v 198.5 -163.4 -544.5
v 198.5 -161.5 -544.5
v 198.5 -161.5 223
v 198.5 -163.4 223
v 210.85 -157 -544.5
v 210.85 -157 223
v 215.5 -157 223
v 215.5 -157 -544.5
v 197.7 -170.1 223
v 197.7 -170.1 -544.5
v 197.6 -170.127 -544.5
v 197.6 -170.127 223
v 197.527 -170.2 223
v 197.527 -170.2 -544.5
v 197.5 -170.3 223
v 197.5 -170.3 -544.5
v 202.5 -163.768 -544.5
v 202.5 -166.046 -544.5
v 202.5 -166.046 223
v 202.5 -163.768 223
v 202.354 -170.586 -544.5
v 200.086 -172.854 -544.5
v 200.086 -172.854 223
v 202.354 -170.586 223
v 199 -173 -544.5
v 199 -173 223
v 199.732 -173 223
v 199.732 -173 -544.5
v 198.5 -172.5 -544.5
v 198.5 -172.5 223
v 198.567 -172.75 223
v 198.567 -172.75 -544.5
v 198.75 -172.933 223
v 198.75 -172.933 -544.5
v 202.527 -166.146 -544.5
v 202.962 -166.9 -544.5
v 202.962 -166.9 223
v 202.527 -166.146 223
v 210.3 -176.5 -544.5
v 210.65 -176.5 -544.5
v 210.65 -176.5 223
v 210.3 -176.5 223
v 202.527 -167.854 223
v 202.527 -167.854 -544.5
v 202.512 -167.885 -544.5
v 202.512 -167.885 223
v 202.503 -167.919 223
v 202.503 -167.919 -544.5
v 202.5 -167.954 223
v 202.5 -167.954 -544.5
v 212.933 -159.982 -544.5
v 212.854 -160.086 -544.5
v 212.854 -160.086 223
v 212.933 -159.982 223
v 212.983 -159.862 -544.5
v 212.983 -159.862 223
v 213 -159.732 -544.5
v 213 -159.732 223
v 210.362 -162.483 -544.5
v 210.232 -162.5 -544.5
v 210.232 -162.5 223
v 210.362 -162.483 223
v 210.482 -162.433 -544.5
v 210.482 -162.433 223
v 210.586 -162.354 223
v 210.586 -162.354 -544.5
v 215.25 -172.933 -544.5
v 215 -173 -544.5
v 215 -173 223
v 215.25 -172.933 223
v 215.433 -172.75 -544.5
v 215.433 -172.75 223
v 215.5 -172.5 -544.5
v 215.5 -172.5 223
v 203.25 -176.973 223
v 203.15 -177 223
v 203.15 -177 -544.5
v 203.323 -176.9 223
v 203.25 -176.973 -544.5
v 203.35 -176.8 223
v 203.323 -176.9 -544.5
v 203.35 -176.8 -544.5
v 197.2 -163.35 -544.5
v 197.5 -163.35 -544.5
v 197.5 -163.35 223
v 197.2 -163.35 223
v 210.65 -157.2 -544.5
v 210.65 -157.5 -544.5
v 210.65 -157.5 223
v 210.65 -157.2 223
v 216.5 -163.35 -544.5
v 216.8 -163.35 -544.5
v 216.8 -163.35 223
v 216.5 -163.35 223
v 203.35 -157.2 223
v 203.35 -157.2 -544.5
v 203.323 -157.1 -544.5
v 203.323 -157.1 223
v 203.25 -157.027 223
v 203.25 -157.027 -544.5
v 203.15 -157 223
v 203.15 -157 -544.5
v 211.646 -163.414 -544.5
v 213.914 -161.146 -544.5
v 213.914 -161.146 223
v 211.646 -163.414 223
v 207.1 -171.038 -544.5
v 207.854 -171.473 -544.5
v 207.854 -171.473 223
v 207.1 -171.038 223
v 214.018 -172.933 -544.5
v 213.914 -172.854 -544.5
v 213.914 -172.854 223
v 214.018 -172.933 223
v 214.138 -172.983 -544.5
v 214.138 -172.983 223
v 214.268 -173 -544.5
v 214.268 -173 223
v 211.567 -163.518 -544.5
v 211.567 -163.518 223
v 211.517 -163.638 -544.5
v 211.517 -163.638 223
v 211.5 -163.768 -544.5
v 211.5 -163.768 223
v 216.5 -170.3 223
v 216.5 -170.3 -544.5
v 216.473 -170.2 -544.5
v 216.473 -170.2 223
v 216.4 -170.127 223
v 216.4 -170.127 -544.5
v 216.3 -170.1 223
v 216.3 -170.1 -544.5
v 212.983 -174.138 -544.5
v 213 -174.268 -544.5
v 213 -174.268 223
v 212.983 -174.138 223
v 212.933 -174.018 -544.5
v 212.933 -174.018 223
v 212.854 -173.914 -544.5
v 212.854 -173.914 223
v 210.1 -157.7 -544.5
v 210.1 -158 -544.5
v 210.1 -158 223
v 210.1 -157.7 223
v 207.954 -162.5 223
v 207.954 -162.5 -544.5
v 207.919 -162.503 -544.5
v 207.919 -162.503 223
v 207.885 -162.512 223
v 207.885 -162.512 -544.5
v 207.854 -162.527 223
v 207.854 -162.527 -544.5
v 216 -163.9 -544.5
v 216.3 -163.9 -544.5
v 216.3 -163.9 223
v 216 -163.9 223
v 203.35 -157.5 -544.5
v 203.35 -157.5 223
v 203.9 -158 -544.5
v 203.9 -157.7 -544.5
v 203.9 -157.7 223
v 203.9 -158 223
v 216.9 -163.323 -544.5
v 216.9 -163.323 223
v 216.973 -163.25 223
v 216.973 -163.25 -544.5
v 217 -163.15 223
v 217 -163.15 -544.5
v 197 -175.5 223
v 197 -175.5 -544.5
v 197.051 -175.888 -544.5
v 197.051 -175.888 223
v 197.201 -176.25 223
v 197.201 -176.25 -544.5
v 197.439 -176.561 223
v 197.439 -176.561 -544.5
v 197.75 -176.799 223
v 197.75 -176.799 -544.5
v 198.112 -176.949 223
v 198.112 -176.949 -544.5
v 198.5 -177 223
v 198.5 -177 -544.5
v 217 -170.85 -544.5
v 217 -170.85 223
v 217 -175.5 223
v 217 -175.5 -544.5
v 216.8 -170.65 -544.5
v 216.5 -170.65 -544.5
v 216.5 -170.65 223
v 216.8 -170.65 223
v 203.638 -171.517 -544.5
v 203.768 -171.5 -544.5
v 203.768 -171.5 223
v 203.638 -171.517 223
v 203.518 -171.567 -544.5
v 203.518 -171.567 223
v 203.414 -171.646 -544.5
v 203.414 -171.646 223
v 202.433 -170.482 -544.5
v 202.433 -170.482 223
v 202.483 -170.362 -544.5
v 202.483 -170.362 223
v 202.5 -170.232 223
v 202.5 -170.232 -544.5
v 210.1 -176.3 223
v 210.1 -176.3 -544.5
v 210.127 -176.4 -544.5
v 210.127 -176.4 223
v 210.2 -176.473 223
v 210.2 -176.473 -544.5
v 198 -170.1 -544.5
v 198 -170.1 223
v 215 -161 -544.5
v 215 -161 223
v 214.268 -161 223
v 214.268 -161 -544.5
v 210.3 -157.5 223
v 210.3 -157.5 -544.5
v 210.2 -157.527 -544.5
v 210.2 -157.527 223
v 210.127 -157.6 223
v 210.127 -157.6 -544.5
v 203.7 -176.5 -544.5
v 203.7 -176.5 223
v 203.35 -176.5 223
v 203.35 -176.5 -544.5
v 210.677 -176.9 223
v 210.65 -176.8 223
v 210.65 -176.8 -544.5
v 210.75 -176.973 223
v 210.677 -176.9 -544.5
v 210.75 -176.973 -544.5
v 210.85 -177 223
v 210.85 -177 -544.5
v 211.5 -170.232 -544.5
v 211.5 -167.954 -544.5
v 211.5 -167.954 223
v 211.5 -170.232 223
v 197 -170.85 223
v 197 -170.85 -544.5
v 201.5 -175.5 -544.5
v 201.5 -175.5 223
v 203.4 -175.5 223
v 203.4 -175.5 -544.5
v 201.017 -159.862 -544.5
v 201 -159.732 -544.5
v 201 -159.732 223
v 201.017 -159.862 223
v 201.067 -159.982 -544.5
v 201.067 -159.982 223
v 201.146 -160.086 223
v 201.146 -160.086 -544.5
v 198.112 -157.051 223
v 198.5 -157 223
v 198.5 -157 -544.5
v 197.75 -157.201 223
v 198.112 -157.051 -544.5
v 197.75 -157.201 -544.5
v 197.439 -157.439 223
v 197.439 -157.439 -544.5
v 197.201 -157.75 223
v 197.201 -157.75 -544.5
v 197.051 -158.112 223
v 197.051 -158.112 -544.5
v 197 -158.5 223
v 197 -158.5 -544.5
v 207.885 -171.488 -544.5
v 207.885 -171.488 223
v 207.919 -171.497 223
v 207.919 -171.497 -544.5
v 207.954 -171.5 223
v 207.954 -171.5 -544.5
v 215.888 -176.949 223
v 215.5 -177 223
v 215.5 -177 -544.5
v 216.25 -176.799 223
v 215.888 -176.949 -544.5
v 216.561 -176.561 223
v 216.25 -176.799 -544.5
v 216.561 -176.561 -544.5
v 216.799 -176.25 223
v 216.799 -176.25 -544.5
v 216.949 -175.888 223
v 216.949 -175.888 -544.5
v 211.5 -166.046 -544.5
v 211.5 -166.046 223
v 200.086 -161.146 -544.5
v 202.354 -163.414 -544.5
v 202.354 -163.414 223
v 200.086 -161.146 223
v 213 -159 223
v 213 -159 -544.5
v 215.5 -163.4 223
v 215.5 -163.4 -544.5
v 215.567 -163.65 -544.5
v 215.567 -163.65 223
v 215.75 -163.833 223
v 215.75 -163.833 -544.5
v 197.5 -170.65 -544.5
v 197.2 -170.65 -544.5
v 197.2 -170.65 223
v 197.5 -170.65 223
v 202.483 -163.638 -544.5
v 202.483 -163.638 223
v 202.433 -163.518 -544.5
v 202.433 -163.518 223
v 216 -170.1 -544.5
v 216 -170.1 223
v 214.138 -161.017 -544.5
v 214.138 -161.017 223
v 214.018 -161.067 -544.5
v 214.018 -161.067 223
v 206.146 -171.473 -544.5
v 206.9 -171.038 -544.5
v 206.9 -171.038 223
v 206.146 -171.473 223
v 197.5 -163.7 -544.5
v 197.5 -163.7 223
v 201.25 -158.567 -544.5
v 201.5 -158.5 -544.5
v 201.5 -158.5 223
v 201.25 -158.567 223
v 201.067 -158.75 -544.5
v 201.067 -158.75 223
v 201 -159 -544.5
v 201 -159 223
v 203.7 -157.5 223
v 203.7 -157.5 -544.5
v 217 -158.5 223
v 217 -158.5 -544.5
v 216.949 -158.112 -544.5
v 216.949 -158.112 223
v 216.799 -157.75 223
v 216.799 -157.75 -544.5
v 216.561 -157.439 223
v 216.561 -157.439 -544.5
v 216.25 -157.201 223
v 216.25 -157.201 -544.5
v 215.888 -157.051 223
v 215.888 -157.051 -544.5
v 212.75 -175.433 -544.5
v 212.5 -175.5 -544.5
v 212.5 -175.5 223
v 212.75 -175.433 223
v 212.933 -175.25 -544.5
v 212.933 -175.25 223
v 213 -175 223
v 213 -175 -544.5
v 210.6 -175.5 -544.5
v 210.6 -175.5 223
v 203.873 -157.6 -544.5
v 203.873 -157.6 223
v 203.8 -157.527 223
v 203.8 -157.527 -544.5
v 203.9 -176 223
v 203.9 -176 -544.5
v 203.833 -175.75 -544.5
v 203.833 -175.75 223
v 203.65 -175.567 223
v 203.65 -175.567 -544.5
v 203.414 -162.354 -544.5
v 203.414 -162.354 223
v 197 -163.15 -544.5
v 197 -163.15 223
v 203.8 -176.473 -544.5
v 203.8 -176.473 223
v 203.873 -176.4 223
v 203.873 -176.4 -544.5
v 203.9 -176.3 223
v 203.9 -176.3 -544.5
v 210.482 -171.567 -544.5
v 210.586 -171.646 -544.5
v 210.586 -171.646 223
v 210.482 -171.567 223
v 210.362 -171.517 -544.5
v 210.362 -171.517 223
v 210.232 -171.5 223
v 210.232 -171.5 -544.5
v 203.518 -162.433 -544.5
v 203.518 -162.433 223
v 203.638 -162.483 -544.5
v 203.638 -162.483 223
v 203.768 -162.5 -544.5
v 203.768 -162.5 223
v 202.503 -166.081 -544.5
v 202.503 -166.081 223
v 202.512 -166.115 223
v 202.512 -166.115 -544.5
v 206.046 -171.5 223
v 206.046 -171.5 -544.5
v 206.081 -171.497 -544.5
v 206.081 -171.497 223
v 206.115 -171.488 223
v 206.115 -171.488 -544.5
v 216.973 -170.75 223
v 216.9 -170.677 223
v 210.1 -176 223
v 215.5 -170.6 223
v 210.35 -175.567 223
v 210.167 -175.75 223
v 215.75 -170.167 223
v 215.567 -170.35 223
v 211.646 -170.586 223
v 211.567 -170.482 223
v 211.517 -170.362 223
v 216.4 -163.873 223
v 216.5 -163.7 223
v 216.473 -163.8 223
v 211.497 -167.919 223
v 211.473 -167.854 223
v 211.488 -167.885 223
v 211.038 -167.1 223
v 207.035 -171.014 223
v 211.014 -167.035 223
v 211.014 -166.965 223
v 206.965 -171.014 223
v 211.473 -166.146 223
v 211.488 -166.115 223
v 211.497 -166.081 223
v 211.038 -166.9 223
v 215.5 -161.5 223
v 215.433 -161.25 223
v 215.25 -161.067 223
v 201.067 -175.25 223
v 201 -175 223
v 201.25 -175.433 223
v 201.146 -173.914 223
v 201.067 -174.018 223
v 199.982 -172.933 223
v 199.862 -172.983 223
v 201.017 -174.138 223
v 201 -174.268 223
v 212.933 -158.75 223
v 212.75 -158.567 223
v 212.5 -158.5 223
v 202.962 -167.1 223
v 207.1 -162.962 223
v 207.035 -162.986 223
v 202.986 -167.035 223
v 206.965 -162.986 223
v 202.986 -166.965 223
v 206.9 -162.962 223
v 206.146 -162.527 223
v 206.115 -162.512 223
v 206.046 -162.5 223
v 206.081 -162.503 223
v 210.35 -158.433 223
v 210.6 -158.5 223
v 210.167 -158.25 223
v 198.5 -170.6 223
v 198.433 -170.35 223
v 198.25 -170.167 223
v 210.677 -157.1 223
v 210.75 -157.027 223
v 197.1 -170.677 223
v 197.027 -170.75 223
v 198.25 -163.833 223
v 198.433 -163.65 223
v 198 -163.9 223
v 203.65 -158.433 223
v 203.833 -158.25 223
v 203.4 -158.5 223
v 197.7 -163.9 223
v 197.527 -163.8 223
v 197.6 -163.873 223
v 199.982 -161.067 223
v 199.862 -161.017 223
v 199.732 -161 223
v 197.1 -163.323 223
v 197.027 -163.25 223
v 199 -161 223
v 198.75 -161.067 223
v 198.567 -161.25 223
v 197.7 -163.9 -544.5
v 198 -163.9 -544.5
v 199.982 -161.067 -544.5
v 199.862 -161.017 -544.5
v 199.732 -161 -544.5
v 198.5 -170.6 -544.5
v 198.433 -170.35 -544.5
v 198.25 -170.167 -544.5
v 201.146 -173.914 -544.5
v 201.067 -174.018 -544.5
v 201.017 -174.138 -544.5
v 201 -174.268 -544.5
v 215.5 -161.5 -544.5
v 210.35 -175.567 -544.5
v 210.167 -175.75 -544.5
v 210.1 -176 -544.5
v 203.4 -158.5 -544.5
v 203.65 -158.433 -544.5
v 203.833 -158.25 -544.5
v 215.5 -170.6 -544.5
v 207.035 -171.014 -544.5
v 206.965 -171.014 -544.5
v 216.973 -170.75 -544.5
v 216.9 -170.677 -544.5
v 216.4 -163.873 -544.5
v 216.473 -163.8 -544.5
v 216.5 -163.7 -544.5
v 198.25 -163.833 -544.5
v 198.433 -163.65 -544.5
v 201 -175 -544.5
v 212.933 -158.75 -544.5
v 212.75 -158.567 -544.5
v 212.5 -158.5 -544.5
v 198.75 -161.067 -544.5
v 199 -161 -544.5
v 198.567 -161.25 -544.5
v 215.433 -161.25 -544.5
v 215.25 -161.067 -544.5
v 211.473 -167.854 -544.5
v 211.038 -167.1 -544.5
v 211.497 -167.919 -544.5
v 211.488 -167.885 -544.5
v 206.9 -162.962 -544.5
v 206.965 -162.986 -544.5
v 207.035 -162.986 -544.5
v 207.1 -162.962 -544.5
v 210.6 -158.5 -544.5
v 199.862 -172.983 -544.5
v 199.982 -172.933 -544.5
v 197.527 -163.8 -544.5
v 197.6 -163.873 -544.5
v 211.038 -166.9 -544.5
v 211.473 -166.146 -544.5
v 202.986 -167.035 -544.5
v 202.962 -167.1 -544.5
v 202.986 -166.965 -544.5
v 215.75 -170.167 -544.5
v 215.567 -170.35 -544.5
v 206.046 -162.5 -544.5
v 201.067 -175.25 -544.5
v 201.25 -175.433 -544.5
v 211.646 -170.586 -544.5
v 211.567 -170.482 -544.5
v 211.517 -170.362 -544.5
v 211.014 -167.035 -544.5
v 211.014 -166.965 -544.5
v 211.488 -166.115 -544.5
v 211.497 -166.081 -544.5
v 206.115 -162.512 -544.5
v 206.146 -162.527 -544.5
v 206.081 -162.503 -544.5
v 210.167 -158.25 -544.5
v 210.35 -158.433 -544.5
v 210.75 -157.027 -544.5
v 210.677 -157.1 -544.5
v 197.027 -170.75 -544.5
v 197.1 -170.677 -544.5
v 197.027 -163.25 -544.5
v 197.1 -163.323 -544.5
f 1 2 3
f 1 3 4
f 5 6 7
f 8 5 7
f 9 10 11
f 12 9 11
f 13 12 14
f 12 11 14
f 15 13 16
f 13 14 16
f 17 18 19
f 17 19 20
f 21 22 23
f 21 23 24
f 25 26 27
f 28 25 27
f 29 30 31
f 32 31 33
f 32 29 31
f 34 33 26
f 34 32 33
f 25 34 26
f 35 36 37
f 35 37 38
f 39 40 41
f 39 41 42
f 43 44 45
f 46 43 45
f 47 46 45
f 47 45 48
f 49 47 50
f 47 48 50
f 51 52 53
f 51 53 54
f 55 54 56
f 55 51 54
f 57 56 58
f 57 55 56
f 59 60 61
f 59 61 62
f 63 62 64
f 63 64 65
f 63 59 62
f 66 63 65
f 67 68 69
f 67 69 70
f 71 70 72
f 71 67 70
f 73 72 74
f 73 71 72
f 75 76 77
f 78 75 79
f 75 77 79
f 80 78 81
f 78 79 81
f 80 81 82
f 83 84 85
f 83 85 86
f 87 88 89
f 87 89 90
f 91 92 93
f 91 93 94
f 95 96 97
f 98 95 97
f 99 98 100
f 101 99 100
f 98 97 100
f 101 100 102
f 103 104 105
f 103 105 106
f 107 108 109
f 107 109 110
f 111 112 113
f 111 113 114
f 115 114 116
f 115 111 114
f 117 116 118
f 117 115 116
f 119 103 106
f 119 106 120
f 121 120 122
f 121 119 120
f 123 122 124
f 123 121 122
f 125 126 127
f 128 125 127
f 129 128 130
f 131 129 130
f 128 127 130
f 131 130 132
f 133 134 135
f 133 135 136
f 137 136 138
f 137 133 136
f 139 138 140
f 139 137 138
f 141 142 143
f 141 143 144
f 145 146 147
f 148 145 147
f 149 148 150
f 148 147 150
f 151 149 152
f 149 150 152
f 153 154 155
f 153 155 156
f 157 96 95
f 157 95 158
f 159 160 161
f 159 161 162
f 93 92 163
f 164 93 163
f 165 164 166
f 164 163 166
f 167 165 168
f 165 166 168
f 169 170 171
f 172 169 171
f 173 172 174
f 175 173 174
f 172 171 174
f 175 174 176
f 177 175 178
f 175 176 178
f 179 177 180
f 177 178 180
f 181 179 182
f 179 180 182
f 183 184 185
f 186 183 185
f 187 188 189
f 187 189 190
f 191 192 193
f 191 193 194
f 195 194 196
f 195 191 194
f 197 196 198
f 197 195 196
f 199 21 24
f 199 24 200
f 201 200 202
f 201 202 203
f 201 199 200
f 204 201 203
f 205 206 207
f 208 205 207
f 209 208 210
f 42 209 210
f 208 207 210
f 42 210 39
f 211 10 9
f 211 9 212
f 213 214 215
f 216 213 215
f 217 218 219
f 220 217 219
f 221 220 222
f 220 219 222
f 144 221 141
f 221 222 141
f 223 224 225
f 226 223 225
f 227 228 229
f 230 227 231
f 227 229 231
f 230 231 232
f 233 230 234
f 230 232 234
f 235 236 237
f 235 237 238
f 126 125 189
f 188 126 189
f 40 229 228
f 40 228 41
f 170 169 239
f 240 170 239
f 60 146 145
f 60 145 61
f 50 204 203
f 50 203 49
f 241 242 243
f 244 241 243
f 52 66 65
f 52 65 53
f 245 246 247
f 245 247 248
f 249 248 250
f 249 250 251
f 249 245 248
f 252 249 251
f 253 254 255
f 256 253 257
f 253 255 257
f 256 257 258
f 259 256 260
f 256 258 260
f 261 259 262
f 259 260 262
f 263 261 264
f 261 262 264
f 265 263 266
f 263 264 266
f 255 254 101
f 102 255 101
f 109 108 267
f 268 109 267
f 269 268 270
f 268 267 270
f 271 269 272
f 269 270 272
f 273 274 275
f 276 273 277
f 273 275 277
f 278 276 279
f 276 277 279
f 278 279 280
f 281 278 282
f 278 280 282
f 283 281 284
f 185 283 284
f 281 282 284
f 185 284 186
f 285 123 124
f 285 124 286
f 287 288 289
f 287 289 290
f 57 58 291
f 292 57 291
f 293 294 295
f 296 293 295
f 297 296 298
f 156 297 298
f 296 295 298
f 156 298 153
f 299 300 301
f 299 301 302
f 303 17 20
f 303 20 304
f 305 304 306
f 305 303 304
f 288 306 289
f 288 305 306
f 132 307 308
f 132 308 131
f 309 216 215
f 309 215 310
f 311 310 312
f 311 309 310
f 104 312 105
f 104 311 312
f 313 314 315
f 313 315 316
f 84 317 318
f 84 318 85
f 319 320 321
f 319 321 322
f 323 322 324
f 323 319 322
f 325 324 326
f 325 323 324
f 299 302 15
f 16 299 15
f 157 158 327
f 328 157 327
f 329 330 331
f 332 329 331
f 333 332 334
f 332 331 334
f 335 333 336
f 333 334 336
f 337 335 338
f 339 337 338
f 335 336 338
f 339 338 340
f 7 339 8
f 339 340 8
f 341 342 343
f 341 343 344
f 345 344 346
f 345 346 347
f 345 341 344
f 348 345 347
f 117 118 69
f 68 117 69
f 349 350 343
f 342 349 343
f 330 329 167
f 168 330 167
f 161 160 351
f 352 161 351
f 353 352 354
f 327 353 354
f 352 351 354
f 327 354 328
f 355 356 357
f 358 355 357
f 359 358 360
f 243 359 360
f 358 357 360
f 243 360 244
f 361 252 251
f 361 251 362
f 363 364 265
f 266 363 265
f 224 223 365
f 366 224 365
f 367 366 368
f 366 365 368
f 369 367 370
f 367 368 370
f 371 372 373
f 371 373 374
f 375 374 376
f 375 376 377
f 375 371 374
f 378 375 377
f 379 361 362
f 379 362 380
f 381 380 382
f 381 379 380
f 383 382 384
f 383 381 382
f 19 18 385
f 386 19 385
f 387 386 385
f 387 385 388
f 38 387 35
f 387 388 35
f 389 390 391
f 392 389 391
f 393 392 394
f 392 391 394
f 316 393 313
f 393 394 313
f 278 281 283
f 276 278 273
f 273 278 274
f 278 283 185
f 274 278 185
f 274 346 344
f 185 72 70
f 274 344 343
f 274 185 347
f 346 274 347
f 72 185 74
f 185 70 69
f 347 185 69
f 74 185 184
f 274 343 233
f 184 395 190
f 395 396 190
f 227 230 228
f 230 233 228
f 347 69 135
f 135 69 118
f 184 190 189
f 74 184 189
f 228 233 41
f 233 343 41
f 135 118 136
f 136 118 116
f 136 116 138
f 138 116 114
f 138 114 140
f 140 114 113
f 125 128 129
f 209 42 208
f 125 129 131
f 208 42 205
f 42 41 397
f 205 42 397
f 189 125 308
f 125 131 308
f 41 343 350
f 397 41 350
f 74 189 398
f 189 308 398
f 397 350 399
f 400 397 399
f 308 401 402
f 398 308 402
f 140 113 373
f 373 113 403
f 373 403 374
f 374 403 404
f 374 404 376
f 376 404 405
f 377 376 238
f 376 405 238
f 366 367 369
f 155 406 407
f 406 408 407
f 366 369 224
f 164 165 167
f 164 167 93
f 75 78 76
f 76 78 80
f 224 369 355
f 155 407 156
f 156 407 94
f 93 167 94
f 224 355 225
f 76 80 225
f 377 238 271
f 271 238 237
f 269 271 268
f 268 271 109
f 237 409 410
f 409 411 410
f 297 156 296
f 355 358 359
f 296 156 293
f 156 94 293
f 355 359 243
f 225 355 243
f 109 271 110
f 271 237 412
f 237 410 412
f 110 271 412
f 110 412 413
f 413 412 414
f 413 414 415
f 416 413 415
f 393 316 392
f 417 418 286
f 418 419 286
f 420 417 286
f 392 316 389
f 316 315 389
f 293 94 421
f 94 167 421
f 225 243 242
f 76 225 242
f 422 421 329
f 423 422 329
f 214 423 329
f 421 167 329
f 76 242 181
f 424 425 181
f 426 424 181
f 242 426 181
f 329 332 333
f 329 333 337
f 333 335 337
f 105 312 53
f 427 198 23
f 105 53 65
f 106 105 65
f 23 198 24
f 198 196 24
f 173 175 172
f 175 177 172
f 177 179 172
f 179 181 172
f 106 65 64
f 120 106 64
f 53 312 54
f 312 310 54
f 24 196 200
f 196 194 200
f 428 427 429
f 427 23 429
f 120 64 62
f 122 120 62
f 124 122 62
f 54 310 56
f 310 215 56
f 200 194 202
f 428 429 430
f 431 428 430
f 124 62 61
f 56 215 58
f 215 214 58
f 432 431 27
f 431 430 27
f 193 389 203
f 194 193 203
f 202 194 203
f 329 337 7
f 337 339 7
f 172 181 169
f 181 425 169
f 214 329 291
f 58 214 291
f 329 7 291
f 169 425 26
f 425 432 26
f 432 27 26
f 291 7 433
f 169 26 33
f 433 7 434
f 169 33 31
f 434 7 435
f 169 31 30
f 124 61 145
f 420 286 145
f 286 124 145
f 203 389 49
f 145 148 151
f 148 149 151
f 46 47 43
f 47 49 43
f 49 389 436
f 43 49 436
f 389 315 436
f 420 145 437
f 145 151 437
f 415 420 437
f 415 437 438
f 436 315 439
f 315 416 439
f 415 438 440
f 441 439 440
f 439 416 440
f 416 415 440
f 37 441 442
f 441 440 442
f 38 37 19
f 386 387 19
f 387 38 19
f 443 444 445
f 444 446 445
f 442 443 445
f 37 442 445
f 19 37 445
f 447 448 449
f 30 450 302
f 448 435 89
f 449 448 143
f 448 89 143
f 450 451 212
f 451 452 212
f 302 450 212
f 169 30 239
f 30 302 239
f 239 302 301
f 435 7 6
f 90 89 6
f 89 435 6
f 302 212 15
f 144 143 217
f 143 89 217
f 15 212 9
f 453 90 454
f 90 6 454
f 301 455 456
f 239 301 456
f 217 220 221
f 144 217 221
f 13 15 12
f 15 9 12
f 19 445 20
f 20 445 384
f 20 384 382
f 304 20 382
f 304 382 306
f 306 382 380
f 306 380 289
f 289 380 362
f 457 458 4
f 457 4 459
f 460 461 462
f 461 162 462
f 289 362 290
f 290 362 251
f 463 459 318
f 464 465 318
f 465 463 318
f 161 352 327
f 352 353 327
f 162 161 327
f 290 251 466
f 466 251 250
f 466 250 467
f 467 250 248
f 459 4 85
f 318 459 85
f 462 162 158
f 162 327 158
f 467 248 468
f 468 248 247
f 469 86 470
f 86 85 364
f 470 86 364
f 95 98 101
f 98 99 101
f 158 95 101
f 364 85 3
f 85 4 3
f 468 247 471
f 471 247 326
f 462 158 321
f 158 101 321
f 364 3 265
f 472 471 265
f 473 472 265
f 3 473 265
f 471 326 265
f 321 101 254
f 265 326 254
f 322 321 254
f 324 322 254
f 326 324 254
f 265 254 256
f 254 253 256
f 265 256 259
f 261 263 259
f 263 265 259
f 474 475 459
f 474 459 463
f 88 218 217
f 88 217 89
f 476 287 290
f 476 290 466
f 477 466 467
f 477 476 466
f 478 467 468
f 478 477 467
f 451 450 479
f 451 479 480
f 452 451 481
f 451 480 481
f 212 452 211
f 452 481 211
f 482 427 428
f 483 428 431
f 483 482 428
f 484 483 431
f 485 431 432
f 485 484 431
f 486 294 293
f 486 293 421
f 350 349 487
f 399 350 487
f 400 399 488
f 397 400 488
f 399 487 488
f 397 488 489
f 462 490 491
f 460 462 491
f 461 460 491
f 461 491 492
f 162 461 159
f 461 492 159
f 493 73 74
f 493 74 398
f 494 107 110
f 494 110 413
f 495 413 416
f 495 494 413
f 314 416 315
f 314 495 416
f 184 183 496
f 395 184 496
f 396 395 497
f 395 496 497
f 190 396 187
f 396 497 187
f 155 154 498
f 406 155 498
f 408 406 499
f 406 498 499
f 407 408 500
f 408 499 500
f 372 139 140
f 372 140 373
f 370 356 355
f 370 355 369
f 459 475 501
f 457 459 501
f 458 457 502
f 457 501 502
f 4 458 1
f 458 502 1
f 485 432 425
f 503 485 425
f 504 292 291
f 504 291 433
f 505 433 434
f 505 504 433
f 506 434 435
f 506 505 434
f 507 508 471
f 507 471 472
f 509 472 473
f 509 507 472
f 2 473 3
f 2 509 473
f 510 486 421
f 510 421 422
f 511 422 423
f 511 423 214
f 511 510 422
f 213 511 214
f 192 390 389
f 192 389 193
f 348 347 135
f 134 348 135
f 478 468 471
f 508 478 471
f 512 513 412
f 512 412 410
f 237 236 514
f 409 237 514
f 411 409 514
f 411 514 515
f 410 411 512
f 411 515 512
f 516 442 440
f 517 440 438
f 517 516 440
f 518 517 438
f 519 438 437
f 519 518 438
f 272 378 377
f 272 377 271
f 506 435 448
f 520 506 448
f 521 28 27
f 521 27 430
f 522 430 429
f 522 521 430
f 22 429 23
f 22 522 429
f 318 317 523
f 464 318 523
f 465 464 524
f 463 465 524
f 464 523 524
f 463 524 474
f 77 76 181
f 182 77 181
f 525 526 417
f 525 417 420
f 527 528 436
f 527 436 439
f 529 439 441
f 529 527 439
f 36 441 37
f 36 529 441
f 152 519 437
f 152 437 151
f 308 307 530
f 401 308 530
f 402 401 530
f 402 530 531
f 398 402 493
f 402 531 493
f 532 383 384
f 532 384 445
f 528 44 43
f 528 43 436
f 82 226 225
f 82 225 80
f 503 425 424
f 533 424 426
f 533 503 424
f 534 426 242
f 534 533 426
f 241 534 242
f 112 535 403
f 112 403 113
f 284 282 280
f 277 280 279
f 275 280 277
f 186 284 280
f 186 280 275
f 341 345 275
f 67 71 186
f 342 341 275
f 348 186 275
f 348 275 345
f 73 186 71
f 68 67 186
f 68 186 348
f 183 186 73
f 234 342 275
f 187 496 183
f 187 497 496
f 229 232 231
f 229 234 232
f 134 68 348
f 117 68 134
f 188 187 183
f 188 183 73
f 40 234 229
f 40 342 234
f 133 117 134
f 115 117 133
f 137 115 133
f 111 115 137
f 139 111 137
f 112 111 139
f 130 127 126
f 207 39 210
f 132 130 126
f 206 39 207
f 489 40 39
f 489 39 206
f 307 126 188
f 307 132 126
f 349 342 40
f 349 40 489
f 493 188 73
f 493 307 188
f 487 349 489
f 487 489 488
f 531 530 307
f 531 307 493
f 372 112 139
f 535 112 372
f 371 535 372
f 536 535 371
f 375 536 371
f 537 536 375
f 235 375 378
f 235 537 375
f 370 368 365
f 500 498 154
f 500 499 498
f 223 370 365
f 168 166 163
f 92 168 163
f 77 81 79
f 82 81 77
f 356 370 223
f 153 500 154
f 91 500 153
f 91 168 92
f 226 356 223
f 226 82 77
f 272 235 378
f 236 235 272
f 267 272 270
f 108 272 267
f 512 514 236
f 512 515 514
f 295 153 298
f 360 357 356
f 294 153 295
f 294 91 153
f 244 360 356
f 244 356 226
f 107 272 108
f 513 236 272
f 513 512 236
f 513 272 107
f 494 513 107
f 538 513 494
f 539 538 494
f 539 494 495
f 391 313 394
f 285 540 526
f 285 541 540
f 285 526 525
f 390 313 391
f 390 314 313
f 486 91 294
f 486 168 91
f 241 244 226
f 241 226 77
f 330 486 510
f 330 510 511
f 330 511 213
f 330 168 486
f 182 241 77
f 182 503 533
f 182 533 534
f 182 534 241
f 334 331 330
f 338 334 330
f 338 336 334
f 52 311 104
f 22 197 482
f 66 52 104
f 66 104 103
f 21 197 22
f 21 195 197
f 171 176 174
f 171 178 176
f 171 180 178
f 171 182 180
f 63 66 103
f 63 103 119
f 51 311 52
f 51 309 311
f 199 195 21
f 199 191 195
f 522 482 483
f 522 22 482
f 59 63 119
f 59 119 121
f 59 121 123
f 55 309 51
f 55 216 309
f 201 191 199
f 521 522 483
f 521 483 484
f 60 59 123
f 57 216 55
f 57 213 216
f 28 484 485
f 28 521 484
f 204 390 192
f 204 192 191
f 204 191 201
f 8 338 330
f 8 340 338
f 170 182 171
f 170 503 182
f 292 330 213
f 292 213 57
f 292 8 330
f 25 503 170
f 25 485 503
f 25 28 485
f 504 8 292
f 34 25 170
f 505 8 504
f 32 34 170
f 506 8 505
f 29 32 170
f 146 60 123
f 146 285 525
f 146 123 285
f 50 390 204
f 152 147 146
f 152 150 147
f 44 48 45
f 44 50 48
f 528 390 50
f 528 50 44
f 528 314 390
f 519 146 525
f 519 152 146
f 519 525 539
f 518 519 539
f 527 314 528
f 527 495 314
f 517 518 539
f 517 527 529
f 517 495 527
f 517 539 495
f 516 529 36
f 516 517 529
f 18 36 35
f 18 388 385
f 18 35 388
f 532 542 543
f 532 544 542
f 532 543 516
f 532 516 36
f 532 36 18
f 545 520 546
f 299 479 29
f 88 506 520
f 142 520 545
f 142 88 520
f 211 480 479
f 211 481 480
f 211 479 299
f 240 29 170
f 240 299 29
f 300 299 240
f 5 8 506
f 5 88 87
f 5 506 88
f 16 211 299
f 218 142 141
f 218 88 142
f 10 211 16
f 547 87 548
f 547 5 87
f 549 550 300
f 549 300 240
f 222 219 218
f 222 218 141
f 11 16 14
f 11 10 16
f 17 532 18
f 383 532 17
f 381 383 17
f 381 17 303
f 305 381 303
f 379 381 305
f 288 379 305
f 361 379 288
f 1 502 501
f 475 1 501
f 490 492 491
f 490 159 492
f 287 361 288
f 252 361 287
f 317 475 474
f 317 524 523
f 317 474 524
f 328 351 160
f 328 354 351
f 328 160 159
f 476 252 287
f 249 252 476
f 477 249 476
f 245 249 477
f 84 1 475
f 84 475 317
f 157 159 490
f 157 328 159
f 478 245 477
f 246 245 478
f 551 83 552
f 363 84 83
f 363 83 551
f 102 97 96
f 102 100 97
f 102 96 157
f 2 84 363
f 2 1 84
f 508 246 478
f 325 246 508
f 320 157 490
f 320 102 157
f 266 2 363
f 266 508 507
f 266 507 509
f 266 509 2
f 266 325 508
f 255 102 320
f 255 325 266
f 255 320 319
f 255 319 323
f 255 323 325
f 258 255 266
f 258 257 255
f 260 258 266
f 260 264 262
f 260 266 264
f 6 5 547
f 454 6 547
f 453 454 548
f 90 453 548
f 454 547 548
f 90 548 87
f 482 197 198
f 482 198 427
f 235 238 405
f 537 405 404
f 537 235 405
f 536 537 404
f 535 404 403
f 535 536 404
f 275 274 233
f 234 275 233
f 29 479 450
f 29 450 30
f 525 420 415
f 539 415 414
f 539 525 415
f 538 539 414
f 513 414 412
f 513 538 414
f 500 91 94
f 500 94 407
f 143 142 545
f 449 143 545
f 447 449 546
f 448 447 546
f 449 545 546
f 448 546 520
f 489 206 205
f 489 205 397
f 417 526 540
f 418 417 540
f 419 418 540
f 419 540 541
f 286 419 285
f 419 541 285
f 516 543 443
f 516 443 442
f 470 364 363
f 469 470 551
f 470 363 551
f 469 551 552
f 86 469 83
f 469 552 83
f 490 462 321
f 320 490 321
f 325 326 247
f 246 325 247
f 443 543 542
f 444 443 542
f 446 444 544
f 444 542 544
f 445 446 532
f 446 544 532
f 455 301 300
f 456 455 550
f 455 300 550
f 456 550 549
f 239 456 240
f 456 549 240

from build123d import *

# Parameters (mm, degrees)
PAD012_DEPTH    = 767.5
POCKET029_DEPTH = 767.501


with BuildPart() as pad012:
    # Sketch042 → Pad012 (new body)
    with BuildSketch(Plane(origin=(1.5, 0, 0), x_dir=(1, 0, 0), z_dir=(0, 0, 1))):
        with BuildLine():
            Line((0, 20), (4.65, 20))
            ThreePointArc((4.85, 19.8), (4.791421, 19.941421), (4.65, 20))
            Line((4.85, 19.8), (4.85, 19.5))
            Line((4.85, 19.5), (5.2, 19.5))
            ThreePointArc((5.4, 19.3), (5.341421, 19.441421), (5.2, 19.5))
            Line((5.4, 19.3), (5.4, 19))
            ThreePointArc((4.9, 18.5), (5.253553, 18.646446), (5.4, 19))
            Line((4.9, 18.5), (2.999999, 18.5))
            ThreePointArc((2.999999, 18.5), (2.646446, 18.353553), (2.499999, 18))
            Line((2.499999, 18), (2.499999, 17.267767))
            ThreePointArc((2.499999, 17.267767), (2.53806, 17.076425), (2.646446, 16.914213))
            Line((2.646446, 16.914213), (4.914213, 14.646447))
            ThreePointArc((4.914213, 14.646447), (5.076424, 14.53806), (5.267766, 14.5))
            Line((5.267766, 14.5), (7.54641, 14.5))
            ThreePointArc((7.64641, 14.473205), (7.598173, 14.493185), (7.54641, 14.5))
            Line((7.64641, 14.473205), (8.4, 14.03812))
            ThreePointArc((8.4, 14.03812), (8.5, 14.011325), (8.6, 14.03812))
            Line((8.6, 14.03812), (9.35359, 14.473205))
            ThreePointArc((9.45359, 14.5), (9.401827, 14.493185), (9.35359, 14.473205))
            Line((9.45359, 14.5), (11.732234, 14.5))
            ThreePointArc((11.732234, 14.5), (11.923576, 14.53806), (12.085787, 14.646447))
            Line((12.085787, 14.646447), (14.353554, 16.914213))
            ThreePointArc((14.353554, 16.914213), (14.46194, 17.076425), (14.500001, 17.267767))
            Line((14.500001, 17.267767), (14.500001, 18))
            ThreePointArc((14.500001, 18), (14.353554, 18.353553), (14.000001, 18.5))
            Line((14.000001, 18.5), (12.1, 18.5))
            ThreePointArc((11.6, 19), (11.746447, 18.646446), (12.1, 18.5))
            Line((11.6, 19), (11.6, 19.3))
            ThreePointArc((11.8, 19.5), (11.658579, 19.441421), (11.6, 19.3))
            Line((11.8, 19.5), (12.15, 19.5))
            Line((12.15, 19.5), (12.15, 19.8))
            ThreePointArc((12.35, 20), (12.208579, 19.941421), (12.15, 19.8))
            Line((12.35, 20), (17, 20))
            ThreePointArc((18.5, 18.5), (18.06066, 19.56066), (17, 20))
            Line((18.5, 18.5), (18.5, 13.85))
            ThreePointArc((18.3, 13.65), (18.441421, 13.708578), (18.5, 13.85))
            Line((18.3, 13.65), (18, 13.65))
            Line((18, 13.65), (18, 13.3))
            ThreePointArc((17.8, 13.1), (17.941421, 13.158579), (18, 13.3))
            Line((17.8, 13.1), (17.5, 13.1))
            ThreePointArc((17, 13.6), (17.146446, 13.246447), (17.5, 13.1))
            Line((17, 13.6), (17, 15.5))
            ThreePointArc((17, 15.5), (16.853553, 15.853553), (16.5, 16))
            Line((16.5, 16), (15.767767, 16))
            ThreePointArc((15.767767, 16), (15.576425, 15.961939), (15.414213, 15.853553))
            Line((15.414213, 15.853553), (13.146446, 13.585786))
            ThreePointArc((13.146446, 13.585786), (13.03806, 13.423574), (13, 13.232233))
            Line((13, 13.232233), (13, 10.953589))
            ThreePointArc((12.973205, 10.853589), (12.993185, 10.901825), (13, 10.953589))
            Line((12.973205, 10.853589), (12.53812, 10.1))
            ThreePointArc((12.53812, 10.1), (12.511325, 10), (12.53812, 9.9))
            Line((12.53812, 9.9), (12.973205, 9.146411))
            ThreePointArc((13, 9.046411), (12.993185, 9.098175), (12.973205, 9.146411))
            Line((13, 9.046411), (13, 6.767767))
            ThreePointArc((13, 6.767767), (13.03806, 6.576426), (13.146446, 6.414214))
            Line((13.146446, 6.414214), (15.414213, 4.146447))
            ThreePointArc((15.414213, 4.146447), (15.576425, 4.038061), (15.767767, 4))
            Line((15.767767, 4), (16.5, 4))
            ThreePointArc((16.5, 4), (16.853553, 4.146447), (17, 4.5))
            Line((17, 4.5), (17, 6.4))
            ThreePointArc((17.5, 6.9), (17.146446, 6.753553), (17, 6.4))
            Line((17.5, 6.9), (17.8, 6.9))
            ThreePointArc((18, 6.7), (17.941421, 6.841421), (17.8, 6.9))
            Line((18, 6.7), (18, 6.35))
            Line((18, 6.35), (18.3, 6.35))
            ThreePointArc((18.5, 6.15), (18.441421, 6.291422), (18.3, 6.35))
            Line((18.5, 6.15), (18.5, 1.5))
            ThreePointArc((17, 0), (18.06066, 0.43934), (18.5, 1.5))
            Line((17, 0), (12.35, 0))
            ThreePointArc((12.15, 0.2), (12.208579, 0.058579), (12.35, 0))
            Line((12.15, 0.2), (12.15, 0.5))
            Line((12.15, 0.5), (11.8, 0.5))
            ThreePointArc((11.6, 0.7), (11.658579, 0.558579), (11.8, 0.5))
            Line((11.6, 0.7), (11.6, 1))
            ThreePointArc((12.1, 1.5), (11.746447, 1.353554), (11.6, 1))
            Line((12.1, 1.5), (14.000001, 1.5))
            ThreePointArc((14.000001, 1.5), (14.353554, 1.646447), (14.500001, 2))
            Line((14.500001, 2), (14.500001, 2.732233))
            ThreePointArc((14.500001, 2.732233), (14.46194, 2.923575), (14.353554, 3.085787))
            Line((14.353554, 3.085787), (12.085787, 5.353553))
            ThreePointArc((12.085787, 5.353553), (11.923576, 5.46194), (11.732234, 5.5))
            Line((11.732234, 5.5), (9.45359, 5.5))
            ThreePointArc((9.35359, 5.526795), (9.401827, 5.506815), (9.45359, 5.5))
            Line((9.35359, 5.526795), (8.6, 5.96188))
            ThreePointArc((8.6, 5.96188), (8.5, 5.988675), (8.4, 5.96188))
            Line((8.4, 5.96188), (7.64641, 5.526795))
            ThreePointArc((7.54641, 5.5), (7.598173, 5.506815), (7.64641, 5.526795))
            Line((7.54641, 5.5), (5.267766, 5.5))
            ThreePointArc((5.267766, 5.5), (5.076424, 5.46194), (4.914213, 5.353553))
            Line((4.914213, 5.353553), (2.646446, 3.085787))
            ThreePointArc((2.646446, 3.085787), (2.53806, 2.923575), (2.499999, 2.732233))
            Line((2.499999, 2.732233), (2.499999, 2))
            ThreePointArc((2.499999, 2), (2.646446, 1.646447), (2.999999, 1.5))
            Line((2.999999, 1.5), (4.9, 1.5))
            ThreePointArc((5.4, 1), (5.253553, 1.353554), (4.9, 1.5))
            Line((5.4, 1), (5.4, 0.7))
            ThreePointArc((5.2, 0.5), (5.341421, 0.558579), (5.4, 0.7))
            Line((5.2, 0.5), (4.85, 0.5))
            Line((4.85, 0.5), (4.85, 0.2))
            ThreePointArc((4.65, 0), (4.791421, 0.058579), (4.85, 0.2))
            Line((4.65, 0), (0, 0))
            ThreePointArc((-1.5, 1.5), (-1.06066, 0.43934), (0, 0))
            Line((-1.5, 1.5), (-1.5, 6.15))
            ThreePointArc((-1.3, 6.35), (-1.441421, 6.291422), (-1.5, 6.15))
            Line((-1.3, 6.35), (-1, 6.35))
            Line((-1, 6.35), (-1, 6.7))
            ThreePointArc((-0.8, 6.9), (-0.941421, 6.841421), (-1, 6.7))
            Line((-0.8, 6.9), (-0.5, 6.9))
            ThreePointArc((0, 6.4), (-0.146446, 6.753553), (-0.5, 6.9))
            Line((0, 6.4), (0, 4.5))
            ThreePointArc((0, 4.5), (0.146447, 4.146447), (0.5, 4))
            Line((0.5, 4), (1.232233, 4))
            ThreePointArc((1.232233, 4), (1.423575, 4.038061), (1.585787, 4.146447))
            Line((1.585787, 4.146447), (3.853554, 6.414214))
            ThreePointArc((3.853554, 6.414214), (3.96194, 6.576426), (4, 6.767767))
            Line((4, 6.767767), (4, 9.046411))
            ThreePointArc((4.026795, 9.146411), (4.006815, 9.098175), (4, 9.046411))
            Line((4.026795, 9.146411), (4.46188, 9.9))
            ThreePointArc((4.46188, 9.9), (4.488675, 10), (4.46188, 10.1))
            Line((4.46188, 10.1), (4.026795, 10.853589))
            ThreePointArc((4, 10.953589), (4.006815, 10.901825), (4.026795, 10.853589))
            Line((4, 10.953589), (4, 13.232233))
            ThreePointArc((4, 13.232233), (3.96194, 13.423574), (3.853554, 13.585786))
            Line((3.853554, 13.585786), (1.585787, 15.853553))
            ThreePointArc((1.585787, 15.853553), (1.423575, 15.961939), (1.232233, 16))
            Line((1.232233, 16), (0.5, 16))
            ThreePointArc((0.5, 16), (0.146447, 15.853553), (0, 15.5))
            Line((0, 15.5), (0, 13.6))
            ThreePointArc((-0.5, 13.1), (-0.146446, 13.246447), (0, 13.6))
            Line((-0.5, 13.1), (-0.8, 13.1))
            ThreePointArc((-1, 13.3), (-0.941421, 13.158579), (-0.8, 13.1))
            Line((-1, 13.3), (-1, 13.65))
            Line((-1, 13.65), (-1.3, 13.65))
            ThreePointArc((-1.5, 13.85), (-1.441421, 13.708578), (-1.3, 13.65))
            Line((-1.5, 13.85), (-1.5, 18.5))
            ThreePointArc((0, 20), (-1.06066, 19.56066), (-1.5, 18.5))
        make_face()
    extrude(amount=PAD012_DEPTH)


with BuildPart() as pocket029:
    # Pocket029 base: copy of Pad012
    add(pad012.part)

    # Sketch043 → Pocket029 (cut, through all)
    with BuildSketch(Plane(origin=(1.5, 0, 767.5), x_dir=(1, 0, 0), z_dir=(0, 0, 1))):
        with BuildLine():
            ThreePointArc((6.586105, 12.989641), (5.988263, 12.50841), (5.507825, 11.909931))
            Line((6.054705, 11.258185), (5.507825, 11.909931))
            ThreePointArc((6.054705, 11.258185), (5.75, 10), (6.054705, 8.741815))
            Line((5.507825, 8.090069), (6.054705, 8.741815))
            ThreePointArc((5.507825, 8.090069), (5.988263, 7.49159), (6.586105, 7.010359))
            Line((7.241815, 7.554705), (6.586105, 7.010359))
            ThreePointArc((7.241815, 7.554705), (8.5, 7.25), (9.758185, 7.554705))
            Line((10.413895, 7.010359), (9.758185, 7.554705))
            ThreePointArc((10.413895, 7.010359), (11.011737, 7.49159), (11.492175, 8.090069))
            Line((10.945295, 8.741815), (11.492175, 8.090069))
            ThreePointArc((10.945295, 8.741815), (11.25, 10), (10.945295, 11.258185))
            Line((11.492175, 11.909931), (10.945295, 11.258185))
            ThreePointArc((11.492175, 11.909931), (11.011737, 12.50841), (10.413895, 12.989641))
            Line((9.758185, 12.445295), (10.413895, 12.989641))
            ThreePointArc((9.758185, 12.445295), (8.5, 12.75), (7.241815, 12.445295))
            Line((6.586105, 12.989641), (7.241815, 12.445295))
        make_face()
    extrude(amount=-POCKET029_DEPTH, mode=Mode.SUBTRACT)


with BuildPart() as fusion029:
    # Fusion029 base: copy of Pad012
    add(pad012.part)

    # Fusion029: union Pocket029
    add(pocket029.part)


with BuildPart() as fusion029_1:
    # Fusion029 placement: moved
    add(fusion029.part.moved(Location((197, -177, -544.5))))


solid = fusion029_1.part
